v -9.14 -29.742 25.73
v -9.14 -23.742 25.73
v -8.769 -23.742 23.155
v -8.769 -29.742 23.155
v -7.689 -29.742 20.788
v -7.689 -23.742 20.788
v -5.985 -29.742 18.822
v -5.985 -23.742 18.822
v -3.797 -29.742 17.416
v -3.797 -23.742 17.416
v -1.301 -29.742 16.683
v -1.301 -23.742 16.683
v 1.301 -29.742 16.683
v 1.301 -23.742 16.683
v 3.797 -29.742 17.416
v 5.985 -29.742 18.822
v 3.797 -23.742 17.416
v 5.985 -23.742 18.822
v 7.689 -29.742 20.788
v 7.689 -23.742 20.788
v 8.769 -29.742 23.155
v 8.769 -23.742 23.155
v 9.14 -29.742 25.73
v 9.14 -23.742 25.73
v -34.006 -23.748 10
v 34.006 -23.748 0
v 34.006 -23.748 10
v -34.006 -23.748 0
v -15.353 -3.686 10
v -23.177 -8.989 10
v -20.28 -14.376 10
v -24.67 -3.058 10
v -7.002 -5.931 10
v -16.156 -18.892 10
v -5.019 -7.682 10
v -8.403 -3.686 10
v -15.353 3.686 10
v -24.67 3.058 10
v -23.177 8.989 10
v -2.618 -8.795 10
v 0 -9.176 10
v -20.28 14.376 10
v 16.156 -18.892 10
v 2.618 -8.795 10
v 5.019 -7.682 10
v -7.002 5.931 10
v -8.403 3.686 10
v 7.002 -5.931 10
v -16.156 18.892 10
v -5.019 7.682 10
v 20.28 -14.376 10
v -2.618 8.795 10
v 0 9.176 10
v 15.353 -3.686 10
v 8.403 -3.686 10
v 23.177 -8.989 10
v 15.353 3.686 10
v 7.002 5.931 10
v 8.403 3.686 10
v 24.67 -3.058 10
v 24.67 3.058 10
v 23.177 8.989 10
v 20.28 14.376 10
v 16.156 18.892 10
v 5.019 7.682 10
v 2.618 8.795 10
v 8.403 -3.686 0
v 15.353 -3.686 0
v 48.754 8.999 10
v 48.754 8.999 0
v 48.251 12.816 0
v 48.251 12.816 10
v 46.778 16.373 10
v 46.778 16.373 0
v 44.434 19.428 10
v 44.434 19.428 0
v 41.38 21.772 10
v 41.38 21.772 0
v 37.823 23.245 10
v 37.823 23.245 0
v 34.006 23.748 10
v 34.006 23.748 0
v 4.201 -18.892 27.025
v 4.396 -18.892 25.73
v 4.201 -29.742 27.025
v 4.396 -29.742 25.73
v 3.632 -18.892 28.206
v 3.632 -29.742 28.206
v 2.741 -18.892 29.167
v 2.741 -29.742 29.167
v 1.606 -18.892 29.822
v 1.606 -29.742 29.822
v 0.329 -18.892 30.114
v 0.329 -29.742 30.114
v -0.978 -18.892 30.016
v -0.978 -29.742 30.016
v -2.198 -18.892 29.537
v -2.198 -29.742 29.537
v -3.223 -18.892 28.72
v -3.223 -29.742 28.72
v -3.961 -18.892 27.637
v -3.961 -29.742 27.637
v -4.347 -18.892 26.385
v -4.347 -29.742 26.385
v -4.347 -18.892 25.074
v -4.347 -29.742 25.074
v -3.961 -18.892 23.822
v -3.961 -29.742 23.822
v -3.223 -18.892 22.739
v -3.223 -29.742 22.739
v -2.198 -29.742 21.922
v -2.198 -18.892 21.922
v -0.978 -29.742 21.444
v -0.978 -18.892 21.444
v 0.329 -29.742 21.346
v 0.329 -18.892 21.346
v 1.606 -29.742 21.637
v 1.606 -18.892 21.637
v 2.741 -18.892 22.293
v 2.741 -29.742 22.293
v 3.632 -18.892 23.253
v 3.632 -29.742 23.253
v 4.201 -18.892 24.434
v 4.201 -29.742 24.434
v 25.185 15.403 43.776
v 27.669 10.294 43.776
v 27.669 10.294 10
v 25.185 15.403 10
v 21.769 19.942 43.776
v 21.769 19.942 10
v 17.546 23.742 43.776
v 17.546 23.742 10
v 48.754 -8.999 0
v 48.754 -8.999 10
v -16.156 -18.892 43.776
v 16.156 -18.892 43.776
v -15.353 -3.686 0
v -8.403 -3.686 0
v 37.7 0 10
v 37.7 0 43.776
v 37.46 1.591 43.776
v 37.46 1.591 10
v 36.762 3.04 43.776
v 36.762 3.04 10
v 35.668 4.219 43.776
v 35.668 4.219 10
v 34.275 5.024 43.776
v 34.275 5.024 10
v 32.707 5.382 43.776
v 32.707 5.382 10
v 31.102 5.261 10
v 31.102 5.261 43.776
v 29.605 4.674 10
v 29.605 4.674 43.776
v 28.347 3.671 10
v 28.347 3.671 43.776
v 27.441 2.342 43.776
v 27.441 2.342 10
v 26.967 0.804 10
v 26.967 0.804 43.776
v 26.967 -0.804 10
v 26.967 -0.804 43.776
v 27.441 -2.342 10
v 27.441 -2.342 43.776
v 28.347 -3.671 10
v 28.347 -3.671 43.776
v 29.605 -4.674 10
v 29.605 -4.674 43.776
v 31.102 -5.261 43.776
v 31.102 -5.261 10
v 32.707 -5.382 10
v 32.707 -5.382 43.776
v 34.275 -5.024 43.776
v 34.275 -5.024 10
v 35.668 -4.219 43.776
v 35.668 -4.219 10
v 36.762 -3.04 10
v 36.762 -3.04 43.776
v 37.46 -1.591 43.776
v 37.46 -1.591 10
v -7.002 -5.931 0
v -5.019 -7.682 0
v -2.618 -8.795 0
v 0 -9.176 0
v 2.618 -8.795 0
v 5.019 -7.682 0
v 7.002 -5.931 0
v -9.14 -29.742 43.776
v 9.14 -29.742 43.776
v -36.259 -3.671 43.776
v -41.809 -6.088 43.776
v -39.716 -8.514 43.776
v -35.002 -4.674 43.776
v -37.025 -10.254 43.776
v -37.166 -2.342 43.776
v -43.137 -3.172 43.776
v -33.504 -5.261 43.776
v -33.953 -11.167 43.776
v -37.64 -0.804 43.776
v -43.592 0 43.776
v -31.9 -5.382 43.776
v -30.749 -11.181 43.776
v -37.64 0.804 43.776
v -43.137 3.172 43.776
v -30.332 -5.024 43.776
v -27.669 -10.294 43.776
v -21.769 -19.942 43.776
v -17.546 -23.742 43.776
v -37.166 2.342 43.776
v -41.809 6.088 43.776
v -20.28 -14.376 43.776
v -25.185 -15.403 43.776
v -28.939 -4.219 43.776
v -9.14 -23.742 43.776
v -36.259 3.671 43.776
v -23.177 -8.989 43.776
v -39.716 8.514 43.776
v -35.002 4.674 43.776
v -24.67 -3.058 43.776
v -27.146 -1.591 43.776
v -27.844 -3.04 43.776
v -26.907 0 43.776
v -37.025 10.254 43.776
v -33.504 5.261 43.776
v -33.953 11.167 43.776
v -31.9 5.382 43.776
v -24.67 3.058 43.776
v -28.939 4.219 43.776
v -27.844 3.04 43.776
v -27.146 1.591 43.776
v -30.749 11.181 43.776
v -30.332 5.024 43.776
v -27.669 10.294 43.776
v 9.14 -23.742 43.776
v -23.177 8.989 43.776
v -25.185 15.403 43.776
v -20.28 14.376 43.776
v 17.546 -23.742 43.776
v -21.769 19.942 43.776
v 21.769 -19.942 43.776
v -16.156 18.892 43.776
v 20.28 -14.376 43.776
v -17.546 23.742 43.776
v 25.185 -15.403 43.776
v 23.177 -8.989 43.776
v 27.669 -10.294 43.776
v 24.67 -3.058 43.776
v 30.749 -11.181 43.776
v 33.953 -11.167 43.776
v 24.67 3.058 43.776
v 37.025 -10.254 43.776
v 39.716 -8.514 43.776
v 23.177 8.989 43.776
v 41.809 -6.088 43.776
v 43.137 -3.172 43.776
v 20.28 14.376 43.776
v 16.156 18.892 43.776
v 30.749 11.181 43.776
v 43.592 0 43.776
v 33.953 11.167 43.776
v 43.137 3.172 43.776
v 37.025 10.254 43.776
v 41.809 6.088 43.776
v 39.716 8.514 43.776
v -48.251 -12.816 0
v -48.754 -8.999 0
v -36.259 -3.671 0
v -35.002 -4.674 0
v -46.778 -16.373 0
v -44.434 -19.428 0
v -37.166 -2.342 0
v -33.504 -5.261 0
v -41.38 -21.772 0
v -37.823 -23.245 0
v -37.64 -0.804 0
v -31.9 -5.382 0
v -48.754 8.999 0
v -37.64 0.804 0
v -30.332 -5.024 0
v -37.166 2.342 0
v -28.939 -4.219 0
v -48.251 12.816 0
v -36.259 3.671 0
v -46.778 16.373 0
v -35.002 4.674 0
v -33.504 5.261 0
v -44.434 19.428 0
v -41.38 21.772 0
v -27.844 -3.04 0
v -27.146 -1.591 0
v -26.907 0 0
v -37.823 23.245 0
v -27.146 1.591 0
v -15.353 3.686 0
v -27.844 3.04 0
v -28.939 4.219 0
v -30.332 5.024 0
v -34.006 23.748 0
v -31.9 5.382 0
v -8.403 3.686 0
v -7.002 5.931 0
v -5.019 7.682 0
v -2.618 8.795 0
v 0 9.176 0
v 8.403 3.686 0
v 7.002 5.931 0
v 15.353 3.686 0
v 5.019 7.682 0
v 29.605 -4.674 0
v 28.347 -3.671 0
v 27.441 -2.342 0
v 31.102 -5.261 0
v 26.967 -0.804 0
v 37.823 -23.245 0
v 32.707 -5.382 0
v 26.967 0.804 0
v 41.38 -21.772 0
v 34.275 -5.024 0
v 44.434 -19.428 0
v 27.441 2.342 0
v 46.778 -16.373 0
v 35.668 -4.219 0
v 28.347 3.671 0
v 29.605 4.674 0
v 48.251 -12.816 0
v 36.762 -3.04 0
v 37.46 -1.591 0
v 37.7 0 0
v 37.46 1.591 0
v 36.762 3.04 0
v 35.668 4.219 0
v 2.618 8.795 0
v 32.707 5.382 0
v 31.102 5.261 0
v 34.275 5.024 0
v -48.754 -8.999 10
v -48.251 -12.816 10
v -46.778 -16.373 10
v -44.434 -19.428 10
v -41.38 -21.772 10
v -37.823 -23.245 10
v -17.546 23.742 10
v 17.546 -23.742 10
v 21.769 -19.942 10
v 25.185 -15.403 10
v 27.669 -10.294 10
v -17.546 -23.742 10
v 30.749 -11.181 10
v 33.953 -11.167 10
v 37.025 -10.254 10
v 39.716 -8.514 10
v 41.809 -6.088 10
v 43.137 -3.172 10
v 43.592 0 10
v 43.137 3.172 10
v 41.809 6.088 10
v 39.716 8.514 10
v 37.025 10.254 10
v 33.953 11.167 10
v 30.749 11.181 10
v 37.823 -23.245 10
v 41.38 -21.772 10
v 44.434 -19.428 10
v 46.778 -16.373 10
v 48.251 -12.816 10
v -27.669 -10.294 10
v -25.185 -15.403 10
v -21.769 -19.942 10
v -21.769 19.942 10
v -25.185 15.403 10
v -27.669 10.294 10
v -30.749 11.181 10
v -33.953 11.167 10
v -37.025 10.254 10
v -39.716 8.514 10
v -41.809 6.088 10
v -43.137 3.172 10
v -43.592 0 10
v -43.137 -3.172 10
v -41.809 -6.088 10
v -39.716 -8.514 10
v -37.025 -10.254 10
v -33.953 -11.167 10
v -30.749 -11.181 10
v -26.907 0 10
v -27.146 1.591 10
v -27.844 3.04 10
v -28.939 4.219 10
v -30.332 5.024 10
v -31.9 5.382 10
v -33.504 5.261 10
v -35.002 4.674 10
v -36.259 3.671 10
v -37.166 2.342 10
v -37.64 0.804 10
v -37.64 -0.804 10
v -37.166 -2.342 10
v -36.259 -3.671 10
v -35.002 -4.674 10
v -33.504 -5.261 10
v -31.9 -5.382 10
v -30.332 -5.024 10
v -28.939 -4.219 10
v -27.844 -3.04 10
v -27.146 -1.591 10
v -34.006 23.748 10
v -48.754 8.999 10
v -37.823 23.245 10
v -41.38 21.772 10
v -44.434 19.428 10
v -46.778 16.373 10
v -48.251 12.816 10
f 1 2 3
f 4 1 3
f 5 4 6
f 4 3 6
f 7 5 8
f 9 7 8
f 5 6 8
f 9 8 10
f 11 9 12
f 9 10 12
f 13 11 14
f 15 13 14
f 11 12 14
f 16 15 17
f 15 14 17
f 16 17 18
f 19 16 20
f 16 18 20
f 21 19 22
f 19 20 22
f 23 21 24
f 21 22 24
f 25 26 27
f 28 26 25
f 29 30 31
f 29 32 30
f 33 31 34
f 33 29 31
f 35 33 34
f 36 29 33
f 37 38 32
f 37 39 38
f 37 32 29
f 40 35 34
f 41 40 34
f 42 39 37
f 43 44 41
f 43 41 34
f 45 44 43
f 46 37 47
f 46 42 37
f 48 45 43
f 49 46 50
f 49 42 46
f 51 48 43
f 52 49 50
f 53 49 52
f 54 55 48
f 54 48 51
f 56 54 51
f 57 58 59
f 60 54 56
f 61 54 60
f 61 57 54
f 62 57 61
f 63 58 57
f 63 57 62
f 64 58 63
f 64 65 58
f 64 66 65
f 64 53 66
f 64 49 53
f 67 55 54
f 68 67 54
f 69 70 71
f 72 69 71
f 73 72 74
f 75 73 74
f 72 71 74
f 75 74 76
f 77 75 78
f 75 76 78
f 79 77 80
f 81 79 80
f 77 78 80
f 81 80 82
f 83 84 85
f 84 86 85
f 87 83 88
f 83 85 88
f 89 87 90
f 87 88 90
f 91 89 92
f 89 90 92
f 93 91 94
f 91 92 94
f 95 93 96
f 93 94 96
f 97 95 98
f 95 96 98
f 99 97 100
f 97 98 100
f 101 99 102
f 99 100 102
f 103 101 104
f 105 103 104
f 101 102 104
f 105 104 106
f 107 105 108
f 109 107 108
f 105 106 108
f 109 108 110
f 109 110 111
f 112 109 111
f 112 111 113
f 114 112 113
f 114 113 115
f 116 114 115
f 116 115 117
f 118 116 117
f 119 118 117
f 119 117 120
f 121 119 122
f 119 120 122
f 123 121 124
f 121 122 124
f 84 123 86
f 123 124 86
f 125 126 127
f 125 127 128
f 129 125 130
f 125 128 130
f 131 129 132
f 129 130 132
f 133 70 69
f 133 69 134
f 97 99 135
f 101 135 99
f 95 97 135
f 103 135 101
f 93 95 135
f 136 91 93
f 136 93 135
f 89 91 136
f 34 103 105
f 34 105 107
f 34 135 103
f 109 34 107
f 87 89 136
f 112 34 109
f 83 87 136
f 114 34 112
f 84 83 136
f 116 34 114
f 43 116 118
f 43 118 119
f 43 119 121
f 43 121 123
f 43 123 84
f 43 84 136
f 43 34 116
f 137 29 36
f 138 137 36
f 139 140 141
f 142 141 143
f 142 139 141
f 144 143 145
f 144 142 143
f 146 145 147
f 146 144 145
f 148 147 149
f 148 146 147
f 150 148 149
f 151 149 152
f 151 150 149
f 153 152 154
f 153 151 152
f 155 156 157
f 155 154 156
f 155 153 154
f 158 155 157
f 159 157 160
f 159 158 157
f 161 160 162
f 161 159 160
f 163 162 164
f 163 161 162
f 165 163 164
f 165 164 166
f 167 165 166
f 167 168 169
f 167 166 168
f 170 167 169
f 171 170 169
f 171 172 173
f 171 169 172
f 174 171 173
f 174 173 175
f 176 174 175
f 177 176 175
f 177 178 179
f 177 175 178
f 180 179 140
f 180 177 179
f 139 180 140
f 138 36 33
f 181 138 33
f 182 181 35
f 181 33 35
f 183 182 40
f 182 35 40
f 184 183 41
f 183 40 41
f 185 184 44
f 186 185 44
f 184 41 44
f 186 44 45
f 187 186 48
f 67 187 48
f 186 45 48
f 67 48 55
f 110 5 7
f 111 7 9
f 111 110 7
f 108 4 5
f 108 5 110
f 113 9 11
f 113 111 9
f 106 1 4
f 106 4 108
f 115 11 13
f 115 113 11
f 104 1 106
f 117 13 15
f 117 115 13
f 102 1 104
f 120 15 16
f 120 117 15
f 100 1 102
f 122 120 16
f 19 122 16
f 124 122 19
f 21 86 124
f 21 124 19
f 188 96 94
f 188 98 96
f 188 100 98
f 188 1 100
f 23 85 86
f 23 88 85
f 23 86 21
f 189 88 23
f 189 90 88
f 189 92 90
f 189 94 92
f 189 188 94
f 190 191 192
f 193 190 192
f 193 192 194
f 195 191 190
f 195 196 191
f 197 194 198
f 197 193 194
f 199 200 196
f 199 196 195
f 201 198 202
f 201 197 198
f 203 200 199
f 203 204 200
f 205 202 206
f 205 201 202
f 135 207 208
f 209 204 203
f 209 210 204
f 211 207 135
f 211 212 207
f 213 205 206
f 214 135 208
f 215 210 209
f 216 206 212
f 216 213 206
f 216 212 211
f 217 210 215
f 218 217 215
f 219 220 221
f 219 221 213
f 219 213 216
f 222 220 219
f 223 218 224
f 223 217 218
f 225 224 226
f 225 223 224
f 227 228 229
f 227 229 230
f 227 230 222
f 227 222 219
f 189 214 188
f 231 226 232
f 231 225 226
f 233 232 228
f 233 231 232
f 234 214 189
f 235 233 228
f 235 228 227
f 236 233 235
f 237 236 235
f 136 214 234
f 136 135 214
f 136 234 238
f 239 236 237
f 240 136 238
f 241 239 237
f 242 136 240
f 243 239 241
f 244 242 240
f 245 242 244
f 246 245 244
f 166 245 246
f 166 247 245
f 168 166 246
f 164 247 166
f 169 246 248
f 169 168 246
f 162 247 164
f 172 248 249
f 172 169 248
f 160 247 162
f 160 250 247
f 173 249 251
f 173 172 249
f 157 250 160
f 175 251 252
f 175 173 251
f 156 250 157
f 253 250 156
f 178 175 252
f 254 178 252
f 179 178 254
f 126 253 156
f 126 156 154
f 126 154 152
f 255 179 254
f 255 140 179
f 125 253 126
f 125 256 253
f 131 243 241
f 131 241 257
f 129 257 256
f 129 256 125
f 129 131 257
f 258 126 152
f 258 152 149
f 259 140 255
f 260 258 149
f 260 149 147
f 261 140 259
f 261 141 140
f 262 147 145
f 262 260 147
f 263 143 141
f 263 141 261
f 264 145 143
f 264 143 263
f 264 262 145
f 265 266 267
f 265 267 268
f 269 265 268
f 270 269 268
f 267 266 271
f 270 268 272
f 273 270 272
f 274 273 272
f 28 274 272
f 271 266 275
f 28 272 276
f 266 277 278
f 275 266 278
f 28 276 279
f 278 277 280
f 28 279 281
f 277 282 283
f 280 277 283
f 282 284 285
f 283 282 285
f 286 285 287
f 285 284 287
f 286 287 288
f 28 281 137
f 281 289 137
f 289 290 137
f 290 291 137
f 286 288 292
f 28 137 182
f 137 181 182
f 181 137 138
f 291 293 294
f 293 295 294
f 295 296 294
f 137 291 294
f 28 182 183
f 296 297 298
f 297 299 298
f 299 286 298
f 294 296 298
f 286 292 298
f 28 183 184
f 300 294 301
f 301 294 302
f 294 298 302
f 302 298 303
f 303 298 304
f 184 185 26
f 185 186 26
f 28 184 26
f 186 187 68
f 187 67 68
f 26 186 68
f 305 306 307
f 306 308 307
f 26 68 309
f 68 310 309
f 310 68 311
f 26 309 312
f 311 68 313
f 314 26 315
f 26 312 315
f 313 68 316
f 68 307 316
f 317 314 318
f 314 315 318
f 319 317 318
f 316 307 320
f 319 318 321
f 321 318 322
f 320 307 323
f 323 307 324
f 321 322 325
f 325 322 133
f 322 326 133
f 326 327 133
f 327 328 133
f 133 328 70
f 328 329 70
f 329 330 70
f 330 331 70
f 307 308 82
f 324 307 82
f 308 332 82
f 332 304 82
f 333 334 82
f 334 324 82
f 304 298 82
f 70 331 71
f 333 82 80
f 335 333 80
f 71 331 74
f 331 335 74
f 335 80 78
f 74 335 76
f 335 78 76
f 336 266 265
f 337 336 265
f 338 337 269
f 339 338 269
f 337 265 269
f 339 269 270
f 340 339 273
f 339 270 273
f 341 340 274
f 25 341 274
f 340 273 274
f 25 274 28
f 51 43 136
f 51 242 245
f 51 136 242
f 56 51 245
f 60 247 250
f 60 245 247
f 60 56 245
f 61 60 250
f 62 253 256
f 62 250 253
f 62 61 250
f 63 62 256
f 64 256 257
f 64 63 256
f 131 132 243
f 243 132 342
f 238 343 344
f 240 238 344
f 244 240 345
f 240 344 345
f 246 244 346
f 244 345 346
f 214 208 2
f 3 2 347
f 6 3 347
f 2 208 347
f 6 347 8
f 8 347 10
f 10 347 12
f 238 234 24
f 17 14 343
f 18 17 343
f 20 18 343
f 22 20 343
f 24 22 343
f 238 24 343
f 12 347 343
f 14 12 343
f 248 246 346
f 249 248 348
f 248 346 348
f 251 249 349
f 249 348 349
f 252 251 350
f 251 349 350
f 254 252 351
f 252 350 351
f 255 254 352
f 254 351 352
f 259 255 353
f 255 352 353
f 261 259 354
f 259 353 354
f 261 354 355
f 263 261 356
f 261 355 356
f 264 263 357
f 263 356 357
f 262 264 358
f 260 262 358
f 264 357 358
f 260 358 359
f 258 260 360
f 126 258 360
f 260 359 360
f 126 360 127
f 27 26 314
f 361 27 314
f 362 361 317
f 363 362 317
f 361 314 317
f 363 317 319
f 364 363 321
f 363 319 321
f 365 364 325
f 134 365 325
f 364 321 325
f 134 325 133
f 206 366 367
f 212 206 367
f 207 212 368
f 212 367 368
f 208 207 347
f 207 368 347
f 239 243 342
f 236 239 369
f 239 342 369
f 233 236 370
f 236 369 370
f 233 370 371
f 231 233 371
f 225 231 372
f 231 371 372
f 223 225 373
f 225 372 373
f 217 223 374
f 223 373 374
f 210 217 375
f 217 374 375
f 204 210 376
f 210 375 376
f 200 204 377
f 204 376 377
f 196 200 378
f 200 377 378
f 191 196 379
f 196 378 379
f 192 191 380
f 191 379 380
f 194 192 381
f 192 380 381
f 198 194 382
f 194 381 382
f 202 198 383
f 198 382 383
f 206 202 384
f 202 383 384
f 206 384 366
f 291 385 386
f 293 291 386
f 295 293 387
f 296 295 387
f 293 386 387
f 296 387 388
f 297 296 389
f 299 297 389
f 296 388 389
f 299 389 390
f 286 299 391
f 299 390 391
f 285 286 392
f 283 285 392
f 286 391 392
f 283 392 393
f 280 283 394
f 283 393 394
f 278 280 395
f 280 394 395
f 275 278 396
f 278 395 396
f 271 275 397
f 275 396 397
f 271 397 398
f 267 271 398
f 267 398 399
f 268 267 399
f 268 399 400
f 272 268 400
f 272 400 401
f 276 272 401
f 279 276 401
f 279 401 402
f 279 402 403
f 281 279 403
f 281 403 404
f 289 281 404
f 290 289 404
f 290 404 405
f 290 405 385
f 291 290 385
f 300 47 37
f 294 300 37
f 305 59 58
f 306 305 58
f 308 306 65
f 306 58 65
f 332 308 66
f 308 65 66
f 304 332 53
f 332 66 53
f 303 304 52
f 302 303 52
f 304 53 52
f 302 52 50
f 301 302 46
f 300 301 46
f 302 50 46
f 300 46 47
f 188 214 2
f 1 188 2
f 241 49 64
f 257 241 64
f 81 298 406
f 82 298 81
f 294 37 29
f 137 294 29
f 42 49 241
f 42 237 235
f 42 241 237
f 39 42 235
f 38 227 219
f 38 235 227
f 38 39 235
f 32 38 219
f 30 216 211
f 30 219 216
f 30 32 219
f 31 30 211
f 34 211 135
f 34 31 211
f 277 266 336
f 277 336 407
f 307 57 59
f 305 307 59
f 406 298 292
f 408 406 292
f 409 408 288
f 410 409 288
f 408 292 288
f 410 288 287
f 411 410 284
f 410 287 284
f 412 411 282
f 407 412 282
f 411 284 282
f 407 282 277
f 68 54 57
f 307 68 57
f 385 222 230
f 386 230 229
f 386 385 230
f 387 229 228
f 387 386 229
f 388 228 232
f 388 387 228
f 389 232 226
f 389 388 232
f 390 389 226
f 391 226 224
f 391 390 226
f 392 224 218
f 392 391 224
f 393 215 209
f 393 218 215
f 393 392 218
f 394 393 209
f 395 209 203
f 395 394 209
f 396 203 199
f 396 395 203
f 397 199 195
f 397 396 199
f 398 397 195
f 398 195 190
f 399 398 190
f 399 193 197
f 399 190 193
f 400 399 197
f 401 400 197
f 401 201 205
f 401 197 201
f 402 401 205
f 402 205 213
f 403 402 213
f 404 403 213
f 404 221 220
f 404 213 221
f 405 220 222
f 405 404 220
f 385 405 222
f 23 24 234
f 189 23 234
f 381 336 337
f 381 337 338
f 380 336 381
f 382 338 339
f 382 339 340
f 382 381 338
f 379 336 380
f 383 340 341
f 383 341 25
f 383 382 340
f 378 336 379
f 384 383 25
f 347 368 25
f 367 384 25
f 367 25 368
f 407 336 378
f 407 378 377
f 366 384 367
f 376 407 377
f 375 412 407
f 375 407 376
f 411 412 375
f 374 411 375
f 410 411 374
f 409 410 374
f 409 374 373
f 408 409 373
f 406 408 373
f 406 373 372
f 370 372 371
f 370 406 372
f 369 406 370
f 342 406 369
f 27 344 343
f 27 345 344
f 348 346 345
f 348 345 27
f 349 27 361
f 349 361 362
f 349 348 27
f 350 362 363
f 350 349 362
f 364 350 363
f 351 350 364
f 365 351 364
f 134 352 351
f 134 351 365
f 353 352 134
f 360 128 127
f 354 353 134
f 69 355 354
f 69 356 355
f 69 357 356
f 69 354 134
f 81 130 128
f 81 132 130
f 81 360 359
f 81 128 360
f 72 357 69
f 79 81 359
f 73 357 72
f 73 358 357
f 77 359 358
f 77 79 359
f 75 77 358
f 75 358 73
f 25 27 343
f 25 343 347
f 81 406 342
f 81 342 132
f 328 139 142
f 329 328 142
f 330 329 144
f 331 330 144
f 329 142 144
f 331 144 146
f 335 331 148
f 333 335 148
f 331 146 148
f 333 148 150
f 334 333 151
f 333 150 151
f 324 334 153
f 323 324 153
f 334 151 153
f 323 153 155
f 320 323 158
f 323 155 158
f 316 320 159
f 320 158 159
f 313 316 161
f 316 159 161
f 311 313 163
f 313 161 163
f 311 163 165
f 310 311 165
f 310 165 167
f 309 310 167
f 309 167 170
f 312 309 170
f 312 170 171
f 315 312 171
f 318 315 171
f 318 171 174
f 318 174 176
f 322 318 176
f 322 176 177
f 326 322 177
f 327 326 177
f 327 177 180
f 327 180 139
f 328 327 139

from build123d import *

# Parameters (mm, degrees)
PAD_DEPTH            = 10
PAD001_DEPTH         = 35
SKETCH002_R          = 11.288681
PAD002_DEPTH         = 35
POCKET_DEPTH         = 35.001
SKETCH007_R          = 5.396652
POCKET001_DEPTH      = 10.001
POCKET001_DEPTH_BACK = -35.001
POCKET002_DEPTH      = 10.001
PAD003_DEPTH         = 6
SKETCH010_R          = 4.396251
POCKET003_DEPTH      = 7
SKETCH011_W          = 103.305298
SKETCH011_H          = 76.018318
POCKET004_DEPTH      = 23.748608
POCKET004_DEPTH_BACK = -29.743303


with BuildPart() as part:
    # Sketch → Pad (new body)
    with BuildSketch(Plane.XY):
        with BuildLine():
            ThreePointArc((-34.005628, 23.747608), (-44.43431, 19.427907), (-48.754011, 8.999225))
            Line((-48.754011, -8.999225), (-48.754011, 8.999225))
            ThreePointArc((-48.754011, -8.999225), (-44.43431, -19.427907), (-34.005628, -23.747608))
            Line((34.005628, -23.747608), (-34.005628, -23.747608))
            ThreePointArc((34.005628, -23.747608), (44.43431, -19.427907), (48.754011, -8.999225))
            Line((48.754011, 8.999225), (48.754011, -8.999225))
            ThreePointArc((48.754011, 8.999225), (44.43431, 19.427907), (34.005628, 23.747608))
            Line((-34.005628, 23.747608), (34.005628, 23.747608))
        make_face()
    extrude(amount=PAD_DEPTH)

    # Sketch001 (on Face10 of Pad) → Pad001 (join)
    with BuildSketch(Plane.XY.offset(10)):
        with BuildLine():
            ThreePointArc((17.546094, -23.742303), (29.522235, 0), (17.546094, 23.742303))
            Line((17.546094, 23.742303), (-17.546094, 23.742303))
            ThreePointArc((-17.546094, 23.742303), (-29.522235, 0), (-17.546094, -23.742303))
            Line((-17.546094, -23.742303), (17.546094, -23.742303))
        make_face()
        with BuildLine():
            ThreePointArc((16.156479, -18.892303), (24.858619, 0), (16.156479, 18.892303))
            Line((-16.156479, 18.892303), (16.156479, 18.892303))
            ThreePointArc((-16.156479, 18.892303), (-24.858619, 0), (-16.156479, -18.892303))
            Line((-16.156479, -18.892303), (16.156479, -18.892303))
        make_face(mode=Mode.SUBTRACT)
    extrude(amount=PAD001_DEPTH)

    # Sketch002 (on Face5 of Pad001) → Pad002 (join)
    with BuildSketch(Plane.XY.offset(10)):
        with Locations((32.303345, 0)):
            Circle(SKETCH002_R)
        with Locations((-32.303345, 0)):
            Circle(SKETCH002_R)
    extrude(amount=PAD002_DEPTH)

    # Sketch004 → Pocket (cut, through all)
    with BuildSketch(Plane.XY.offset(10)):
        with BuildLine():
            ThreePointArc((16.156479, -18.892303), (24.858619, 0), (16.156479, 18.892303))
            Line((-16.156479, 18.892303), (16.156479, 18.892303))
            ThreePointArc((-16.156479, 18.892303), (-24.858619, 0), (-16.156479, -18.892303))
            Line((-16.156479, -18.892303), (16.156479, -18.892303))
        make_face()
    extrude(amount=POCKET_DEPTH, mode=Mode.SUBTRACT)

    # Sketch007 → Pocket001 (cut, two sides)
    with BuildSketch(Plane.XY.offset(10)) as pocket001_sk:
        with Locations((32.303345, 0)):
            Circle(SKETCH007_R)
        with Locations((-32.303345, 0)):
            Circle(SKETCH007_R)
    extrude(amount=-POCKET001_DEPTH, mode=Mode.SUBTRACT)
    extrude(pocket001_sk.sketch, amount=-POCKET001_DEPTH_BACK, mode=Mode.SUBTRACT)

    # Sketch008 (on Face38 of Pocket001) → Pocket002 (cut, through all)
    with BuildSketch(Plane.XY.offset(10)):
        with BuildLine():
            ThreePointArc((-8.403063, -3.686291), (0, -9.176067), (8.403063, -3.686291))
            Line((8.403063, -3.686291), (15.352968, -3.686291))
            Line((15.352968, -3.686291), (15.352968, 3.686291))
            Line((15.352968, 3.686291), (8.403063, 3.686291))
            ThreePointArc((8.403063, 3.686291), (0, 9.176067), (-8.403063, 3.686291))
            Line((-8.403063, 3.686291), (-15.352968, 3.686291))
            Line((-15.352968, 3.686291), (-15.352968, -3.686291))
            Line((-15.352968, -3.686291), (-8.403063, -3.686291))
        make_face()
    extrude(amount=-POCKET002_DEPTH, mode=Mode.SUBTRACT)

    # Sketch009 (on Face29 of Pocket002) → Pad003 (join)
    with BuildSketch(Plane.XZ.offset(23.742303)):
        with BuildLine():
            ThreePointArc((-9.139607, 25.729681), (0, 16.590074), (9.139607, 25.729681))
            Line((9.139607, 25.729681), (9.139607, 62.288109))
            ThreePointArc((9.139607, 62.288109), (0, 71.427716), (-9.139607, 62.288109))
            Line((-9.139607, 62.288109), (-9.139607, 25.729681))
        make_face()
    extrude(amount=PAD003_DEPTH)

    # Sketch010 (on Face29 of Pocket002) → Pocket003 (cut, symmetric)
    with BuildSketch(Plane.XZ.offset(23.742303)):
        with Locations((0, 25.729681)):
            Circle(SKETCH010_R)
    extrude(amount=POCKET003_DEPTH, both=True, mode=Mode.SUBTRACT)

    # Sketch011 → Pocket004 (cut, two sides)
    with BuildSketch(Plane.XZ) as pocket004_sk:
        with Locations((0, 81.785393)):
            Rectangle(SKETCH011_W, SKETCH011_H)
    extrude(amount=-POCKET004_DEPTH, mode=Mode.SUBTRACT)
    extrude(pocket004_sk.sketch, amount=-POCKET004_DEPTH_BACK, mode=Mode.SUBTRACT)


solid = part.part
